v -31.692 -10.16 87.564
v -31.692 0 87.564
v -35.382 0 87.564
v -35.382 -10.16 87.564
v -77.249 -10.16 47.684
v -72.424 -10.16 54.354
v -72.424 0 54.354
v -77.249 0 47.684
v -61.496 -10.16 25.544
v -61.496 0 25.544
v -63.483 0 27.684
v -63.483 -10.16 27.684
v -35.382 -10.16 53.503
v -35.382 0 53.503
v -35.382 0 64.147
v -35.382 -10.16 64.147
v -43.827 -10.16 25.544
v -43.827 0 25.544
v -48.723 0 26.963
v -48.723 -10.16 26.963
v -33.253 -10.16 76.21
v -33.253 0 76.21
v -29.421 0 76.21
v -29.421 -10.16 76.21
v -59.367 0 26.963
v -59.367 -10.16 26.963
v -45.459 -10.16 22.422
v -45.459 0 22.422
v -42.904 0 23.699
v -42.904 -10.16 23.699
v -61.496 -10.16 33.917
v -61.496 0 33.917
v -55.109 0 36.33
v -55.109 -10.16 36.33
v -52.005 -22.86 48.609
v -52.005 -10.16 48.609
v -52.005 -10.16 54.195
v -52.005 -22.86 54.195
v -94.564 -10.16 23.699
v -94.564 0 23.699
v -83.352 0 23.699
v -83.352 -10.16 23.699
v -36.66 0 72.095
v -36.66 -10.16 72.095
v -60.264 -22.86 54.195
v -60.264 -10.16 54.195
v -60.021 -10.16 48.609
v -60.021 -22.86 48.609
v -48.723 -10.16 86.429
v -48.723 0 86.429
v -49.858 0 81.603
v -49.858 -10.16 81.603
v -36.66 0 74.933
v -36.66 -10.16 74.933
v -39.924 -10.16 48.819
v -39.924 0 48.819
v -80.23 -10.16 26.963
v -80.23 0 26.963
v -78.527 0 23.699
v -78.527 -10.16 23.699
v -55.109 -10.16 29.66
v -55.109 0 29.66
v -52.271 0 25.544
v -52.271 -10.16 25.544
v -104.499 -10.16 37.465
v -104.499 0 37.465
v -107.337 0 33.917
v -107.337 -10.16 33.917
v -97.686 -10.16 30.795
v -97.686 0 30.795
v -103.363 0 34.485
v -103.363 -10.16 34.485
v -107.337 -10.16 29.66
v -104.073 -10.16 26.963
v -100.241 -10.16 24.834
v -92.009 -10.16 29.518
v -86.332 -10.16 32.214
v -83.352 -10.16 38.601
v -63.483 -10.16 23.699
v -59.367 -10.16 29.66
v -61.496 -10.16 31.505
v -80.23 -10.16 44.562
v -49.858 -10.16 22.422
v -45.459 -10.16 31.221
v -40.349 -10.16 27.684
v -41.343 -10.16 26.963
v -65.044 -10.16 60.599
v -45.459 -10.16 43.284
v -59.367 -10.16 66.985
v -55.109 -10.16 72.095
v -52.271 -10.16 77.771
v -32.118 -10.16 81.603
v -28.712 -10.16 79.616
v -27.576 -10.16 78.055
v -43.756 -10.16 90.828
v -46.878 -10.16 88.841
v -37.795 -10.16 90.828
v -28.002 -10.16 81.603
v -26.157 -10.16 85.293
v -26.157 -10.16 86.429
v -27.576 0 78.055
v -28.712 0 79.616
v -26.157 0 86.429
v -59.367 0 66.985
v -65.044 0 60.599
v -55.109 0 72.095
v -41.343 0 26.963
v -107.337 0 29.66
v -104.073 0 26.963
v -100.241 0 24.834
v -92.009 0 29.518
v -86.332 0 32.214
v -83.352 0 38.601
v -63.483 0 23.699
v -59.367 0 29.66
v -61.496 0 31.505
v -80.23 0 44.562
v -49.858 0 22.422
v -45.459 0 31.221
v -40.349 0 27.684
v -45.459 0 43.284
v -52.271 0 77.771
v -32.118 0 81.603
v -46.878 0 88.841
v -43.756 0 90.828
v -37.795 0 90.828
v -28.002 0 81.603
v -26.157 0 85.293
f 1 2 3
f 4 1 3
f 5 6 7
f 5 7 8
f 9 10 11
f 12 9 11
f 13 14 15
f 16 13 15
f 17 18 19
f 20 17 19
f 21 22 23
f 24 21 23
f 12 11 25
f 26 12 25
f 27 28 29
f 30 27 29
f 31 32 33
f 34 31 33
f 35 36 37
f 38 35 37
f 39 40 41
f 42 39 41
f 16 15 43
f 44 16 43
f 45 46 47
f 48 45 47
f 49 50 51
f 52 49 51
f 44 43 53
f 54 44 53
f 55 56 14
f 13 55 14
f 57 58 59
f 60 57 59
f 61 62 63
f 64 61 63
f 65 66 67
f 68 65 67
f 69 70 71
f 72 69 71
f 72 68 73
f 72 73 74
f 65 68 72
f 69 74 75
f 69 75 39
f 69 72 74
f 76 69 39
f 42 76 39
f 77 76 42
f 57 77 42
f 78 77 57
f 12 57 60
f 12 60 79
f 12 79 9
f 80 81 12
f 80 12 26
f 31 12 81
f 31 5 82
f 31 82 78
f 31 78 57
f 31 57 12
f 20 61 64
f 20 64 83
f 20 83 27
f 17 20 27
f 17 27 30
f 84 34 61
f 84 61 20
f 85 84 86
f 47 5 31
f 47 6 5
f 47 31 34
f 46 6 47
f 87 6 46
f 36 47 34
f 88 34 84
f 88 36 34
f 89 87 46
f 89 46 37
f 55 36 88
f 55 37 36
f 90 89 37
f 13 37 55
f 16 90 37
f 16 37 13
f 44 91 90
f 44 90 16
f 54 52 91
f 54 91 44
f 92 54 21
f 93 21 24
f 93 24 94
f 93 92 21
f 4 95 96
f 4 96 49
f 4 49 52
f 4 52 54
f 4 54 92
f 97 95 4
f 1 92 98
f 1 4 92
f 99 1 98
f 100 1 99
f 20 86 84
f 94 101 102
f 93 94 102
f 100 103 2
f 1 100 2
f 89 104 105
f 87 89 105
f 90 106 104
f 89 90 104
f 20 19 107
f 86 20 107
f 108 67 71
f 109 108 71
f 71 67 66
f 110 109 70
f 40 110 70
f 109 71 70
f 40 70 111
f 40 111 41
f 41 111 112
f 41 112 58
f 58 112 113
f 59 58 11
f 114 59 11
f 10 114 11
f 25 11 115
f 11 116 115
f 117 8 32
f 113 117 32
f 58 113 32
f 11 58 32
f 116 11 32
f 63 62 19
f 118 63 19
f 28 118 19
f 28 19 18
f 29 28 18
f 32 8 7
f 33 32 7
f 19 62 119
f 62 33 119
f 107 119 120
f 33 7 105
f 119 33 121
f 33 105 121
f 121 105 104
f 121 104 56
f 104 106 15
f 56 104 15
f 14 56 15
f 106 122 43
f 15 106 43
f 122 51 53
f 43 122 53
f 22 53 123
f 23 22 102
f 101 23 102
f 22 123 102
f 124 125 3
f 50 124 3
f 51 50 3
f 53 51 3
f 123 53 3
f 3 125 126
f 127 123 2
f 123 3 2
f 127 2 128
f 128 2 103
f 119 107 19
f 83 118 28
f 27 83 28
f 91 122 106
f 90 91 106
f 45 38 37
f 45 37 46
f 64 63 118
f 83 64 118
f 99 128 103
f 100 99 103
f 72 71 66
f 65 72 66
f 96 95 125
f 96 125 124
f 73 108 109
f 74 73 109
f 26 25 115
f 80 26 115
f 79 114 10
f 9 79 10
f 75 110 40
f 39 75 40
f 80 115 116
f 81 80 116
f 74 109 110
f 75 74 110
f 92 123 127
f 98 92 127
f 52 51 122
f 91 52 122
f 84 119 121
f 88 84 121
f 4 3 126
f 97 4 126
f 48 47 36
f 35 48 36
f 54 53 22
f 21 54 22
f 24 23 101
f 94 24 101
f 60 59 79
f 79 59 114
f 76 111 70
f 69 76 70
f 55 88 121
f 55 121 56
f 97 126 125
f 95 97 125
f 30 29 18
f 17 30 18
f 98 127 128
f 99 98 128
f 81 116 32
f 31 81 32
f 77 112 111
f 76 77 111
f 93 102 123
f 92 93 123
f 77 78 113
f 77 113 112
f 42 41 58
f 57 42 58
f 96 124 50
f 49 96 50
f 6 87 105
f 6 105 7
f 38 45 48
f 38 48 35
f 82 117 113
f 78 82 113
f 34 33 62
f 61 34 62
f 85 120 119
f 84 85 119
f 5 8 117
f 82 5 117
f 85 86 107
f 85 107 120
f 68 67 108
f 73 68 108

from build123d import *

# Parameters (mm, degrees)
F1_DEPTH = 10.16
F3_DEPTH = 12.7


with BuildPart() as f1:
    # F0 (on Front) → F1 (new body)
    with BuildSketch(Plane.XZ):
        Polygon((-43.755643, 90.828305), (-46.877941, 88.841388), (-48.722932, 86.428699), (-49.858313, 81.603329), (-52.271002, 77.771422), (-55.109454, 72.094509), (-59.367137, 66.985293), (-65.044043, 60.598771), (-72.424024, 54.354175), (-77.249394, 47.683807), (-80.22977, 44.561509), (-83.352068, 38.600758), (-86.332443, 32.214235), (-92.009354, 29.517705), (-97.686262, 30.795009), (-103.363165, 34.484999), (-104.49855, 37.465376), (-107.337004, 33.917309), (-107.337004, 29.659627), (-104.072782, 26.963097), (-100.240867, 24.834256), (-94.56396, 23.698875), (-88.603207, 23.698875), (-83.352068, 23.698875), (-80.22977, 26.963097), (-78.526698, 23.698875), (-70.153258, 23.698875), (-63.482894, 23.698875), (-61.495977, 25.543871), (-63.482894, 27.683625), (-59.367137, 26.963097), (-59.367137, 29.659627), (-61.495977, 31.504622), (-61.495977, 33.917309), (-55.109454, 36.329995), (-55.109454, 29.659627), (-52.271002, 25.543871), (-49.858313, 22.421573), (-45.458715, 22.421573), (-42.904107, 23.698875), (-43.826604, 25.543871), (-48.722932, 26.963097), (-41.342954, 26.963097), (-40.349492, 27.683625), (-45.458715, 31.220777), (-45.458715, 36.329995), (-45.458715, 43.284205), (-39.923728, 48.819191), (-35.382203, 53.502639), (-35.382203, 58.611854), (-35.382203, 64.146841), (-36.659504, 72.094509), (-36.659504, 74.932962), (-33.25336, 76.210269), (-29.421452, 76.210269), (-27.576454, 78.05526), (-28.711836, 79.616412), (-32.117979, 81.603329), (-28.002219, 81.603329), (-26.157228, 85.293318), (-26.157228, 86.428699), (-31.692215, 87.56408), (-35.382203, 87.56408), (-37.794885, 90.828305), align=None)
    extrude(amount=F1_DEPTH)

    # F2 (on face) → F3 (join)
    with BuildSketch(Plane.XZ.offset(10.16)):
        Polygon((-52.004732, 54.195438), (-60.263611, 54.195438), (-60.020704, 48.608549), (-52.004732, 48.608549), align=None)
    extrude(amount=F3_DEPTH)


solid = f1.part
